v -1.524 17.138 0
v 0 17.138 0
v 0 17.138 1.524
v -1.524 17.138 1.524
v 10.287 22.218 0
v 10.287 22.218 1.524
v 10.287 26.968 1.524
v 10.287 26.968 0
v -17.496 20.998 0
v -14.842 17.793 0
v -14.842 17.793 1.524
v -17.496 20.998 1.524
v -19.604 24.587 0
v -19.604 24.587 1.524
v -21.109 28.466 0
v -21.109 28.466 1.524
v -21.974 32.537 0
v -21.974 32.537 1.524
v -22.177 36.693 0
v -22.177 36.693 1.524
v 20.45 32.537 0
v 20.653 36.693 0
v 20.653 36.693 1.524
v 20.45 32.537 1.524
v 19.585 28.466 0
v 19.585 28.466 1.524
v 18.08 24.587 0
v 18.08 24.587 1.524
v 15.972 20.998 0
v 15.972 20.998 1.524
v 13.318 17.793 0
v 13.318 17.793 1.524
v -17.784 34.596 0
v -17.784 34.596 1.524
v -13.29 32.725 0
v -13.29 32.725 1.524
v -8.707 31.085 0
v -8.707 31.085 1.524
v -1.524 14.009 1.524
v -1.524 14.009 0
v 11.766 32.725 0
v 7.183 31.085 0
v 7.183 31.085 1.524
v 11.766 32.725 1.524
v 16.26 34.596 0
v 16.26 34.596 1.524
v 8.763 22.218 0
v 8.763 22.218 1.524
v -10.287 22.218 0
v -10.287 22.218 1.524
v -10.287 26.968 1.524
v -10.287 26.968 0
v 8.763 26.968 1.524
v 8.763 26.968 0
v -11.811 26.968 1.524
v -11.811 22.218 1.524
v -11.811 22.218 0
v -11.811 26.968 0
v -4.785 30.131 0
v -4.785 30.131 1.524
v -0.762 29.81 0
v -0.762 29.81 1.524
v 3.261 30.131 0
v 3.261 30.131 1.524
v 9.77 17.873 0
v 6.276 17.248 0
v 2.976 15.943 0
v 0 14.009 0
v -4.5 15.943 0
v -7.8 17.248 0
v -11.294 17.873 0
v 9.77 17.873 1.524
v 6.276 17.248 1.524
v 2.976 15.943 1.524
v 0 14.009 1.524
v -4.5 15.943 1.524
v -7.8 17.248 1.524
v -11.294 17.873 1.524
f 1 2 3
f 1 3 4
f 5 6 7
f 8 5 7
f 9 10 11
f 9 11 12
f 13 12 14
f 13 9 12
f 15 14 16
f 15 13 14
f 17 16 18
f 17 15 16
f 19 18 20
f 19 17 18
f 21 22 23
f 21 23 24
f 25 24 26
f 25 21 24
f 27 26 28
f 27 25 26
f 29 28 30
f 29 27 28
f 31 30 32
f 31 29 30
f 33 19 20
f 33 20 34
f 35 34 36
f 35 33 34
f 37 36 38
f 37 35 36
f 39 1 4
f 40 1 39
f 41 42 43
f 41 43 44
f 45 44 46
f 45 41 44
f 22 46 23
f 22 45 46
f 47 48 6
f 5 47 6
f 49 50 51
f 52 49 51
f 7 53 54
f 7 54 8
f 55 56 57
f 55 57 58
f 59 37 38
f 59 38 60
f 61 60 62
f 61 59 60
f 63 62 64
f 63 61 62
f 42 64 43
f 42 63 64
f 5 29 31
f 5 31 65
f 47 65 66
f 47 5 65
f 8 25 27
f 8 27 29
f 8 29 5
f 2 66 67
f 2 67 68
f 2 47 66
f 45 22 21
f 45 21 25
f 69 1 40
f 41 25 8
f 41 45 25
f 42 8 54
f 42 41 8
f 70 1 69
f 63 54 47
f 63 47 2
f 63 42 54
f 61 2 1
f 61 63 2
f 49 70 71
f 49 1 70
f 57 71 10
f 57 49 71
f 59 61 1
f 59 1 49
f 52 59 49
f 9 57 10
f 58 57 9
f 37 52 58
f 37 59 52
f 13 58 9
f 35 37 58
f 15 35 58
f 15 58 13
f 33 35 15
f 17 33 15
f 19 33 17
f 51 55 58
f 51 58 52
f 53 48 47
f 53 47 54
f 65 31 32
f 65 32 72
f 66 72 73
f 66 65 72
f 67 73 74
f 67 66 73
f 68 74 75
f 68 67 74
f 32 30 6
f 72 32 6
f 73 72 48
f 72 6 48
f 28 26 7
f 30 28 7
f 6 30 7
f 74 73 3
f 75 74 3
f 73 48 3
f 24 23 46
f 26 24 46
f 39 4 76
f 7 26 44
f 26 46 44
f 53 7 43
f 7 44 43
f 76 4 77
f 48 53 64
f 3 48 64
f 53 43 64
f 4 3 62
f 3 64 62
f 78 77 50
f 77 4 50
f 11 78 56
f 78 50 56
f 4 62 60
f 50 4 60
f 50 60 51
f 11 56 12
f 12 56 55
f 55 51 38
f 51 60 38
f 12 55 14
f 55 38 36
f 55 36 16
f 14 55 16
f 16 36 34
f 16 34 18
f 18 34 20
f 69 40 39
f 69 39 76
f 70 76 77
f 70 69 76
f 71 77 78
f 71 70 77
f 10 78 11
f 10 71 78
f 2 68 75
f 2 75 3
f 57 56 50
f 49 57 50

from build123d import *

# Parameters (mm, degrees)
BOSS_EXTRUDE1_DEPTH = 1.524
SKETCH2_W           = 1.524
SKETCH2_H           = 4.7498
CUT_EXTRUDE1_DEPTH  = 2.54


with BuildPart() as part:
    # Sketch1 → Boss-Extrude1 (new body)
    with BuildSketch(Plane.XY):
        with BuildLine():
            Line((-1.524, 17.137880282), (-1.524, 14.009051361))
            ThreePointArc((-1.524, 14.009051361), (-7.800379553, 17.247782791), (-14.842010982, 17.793446045))
            ThreePointArc((-14.842010982, 17.793446045), (-20.434373625, 26.496185152), (-22.17694037, 36.693030204))
            ThreePointArc((-22.17694037, 36.693030204), (-15.549040276, 33.631644025), (-8.706859323, 31.08493933))
            ThreePointArc((-8.706859323, 31.08493933), (-0.762, 29.81042814), (7.182859323, 31.08493933))
            ThreePointArc((7.182859323, 31.08493933), (14.025040276, 33.631644025), (20.65294037, 36.693030204))
            ThreePointArc((20.65294037, 36.693030204), (18.910373625, 26.496185152), (13.318010982, 17.793446045))
            ThreePointArc((13.318010982, 17.793446045), (6.276379553, 17.247782791), (0, 14.009051361))
            Line((0, 14.009051361), (0, 17.137880282))
            Line((0, 17.137880282), (-1.524, 17.137880282))
        make_face()
    extrude(amount=BOSS_EXTRUDE1_DEPTH)

    # Sketch2 → Cut-Extrude1 (cut)
    with BuildSketch(Plane.XY.offset(1.524)):
        with Locations((-11.049, 24.592780282)):
            Rectangle(SKETCH2_W, SKETCH2_H)
        with Locations((9.525, 24.592780282)):
            Rectangle(SKETCH2_W, SKETCH2_H)
    extrude(amount=-CUT_EXTRUDE1_DEPTH, mode=Mode.SUBTRACT)


solid = part.part
